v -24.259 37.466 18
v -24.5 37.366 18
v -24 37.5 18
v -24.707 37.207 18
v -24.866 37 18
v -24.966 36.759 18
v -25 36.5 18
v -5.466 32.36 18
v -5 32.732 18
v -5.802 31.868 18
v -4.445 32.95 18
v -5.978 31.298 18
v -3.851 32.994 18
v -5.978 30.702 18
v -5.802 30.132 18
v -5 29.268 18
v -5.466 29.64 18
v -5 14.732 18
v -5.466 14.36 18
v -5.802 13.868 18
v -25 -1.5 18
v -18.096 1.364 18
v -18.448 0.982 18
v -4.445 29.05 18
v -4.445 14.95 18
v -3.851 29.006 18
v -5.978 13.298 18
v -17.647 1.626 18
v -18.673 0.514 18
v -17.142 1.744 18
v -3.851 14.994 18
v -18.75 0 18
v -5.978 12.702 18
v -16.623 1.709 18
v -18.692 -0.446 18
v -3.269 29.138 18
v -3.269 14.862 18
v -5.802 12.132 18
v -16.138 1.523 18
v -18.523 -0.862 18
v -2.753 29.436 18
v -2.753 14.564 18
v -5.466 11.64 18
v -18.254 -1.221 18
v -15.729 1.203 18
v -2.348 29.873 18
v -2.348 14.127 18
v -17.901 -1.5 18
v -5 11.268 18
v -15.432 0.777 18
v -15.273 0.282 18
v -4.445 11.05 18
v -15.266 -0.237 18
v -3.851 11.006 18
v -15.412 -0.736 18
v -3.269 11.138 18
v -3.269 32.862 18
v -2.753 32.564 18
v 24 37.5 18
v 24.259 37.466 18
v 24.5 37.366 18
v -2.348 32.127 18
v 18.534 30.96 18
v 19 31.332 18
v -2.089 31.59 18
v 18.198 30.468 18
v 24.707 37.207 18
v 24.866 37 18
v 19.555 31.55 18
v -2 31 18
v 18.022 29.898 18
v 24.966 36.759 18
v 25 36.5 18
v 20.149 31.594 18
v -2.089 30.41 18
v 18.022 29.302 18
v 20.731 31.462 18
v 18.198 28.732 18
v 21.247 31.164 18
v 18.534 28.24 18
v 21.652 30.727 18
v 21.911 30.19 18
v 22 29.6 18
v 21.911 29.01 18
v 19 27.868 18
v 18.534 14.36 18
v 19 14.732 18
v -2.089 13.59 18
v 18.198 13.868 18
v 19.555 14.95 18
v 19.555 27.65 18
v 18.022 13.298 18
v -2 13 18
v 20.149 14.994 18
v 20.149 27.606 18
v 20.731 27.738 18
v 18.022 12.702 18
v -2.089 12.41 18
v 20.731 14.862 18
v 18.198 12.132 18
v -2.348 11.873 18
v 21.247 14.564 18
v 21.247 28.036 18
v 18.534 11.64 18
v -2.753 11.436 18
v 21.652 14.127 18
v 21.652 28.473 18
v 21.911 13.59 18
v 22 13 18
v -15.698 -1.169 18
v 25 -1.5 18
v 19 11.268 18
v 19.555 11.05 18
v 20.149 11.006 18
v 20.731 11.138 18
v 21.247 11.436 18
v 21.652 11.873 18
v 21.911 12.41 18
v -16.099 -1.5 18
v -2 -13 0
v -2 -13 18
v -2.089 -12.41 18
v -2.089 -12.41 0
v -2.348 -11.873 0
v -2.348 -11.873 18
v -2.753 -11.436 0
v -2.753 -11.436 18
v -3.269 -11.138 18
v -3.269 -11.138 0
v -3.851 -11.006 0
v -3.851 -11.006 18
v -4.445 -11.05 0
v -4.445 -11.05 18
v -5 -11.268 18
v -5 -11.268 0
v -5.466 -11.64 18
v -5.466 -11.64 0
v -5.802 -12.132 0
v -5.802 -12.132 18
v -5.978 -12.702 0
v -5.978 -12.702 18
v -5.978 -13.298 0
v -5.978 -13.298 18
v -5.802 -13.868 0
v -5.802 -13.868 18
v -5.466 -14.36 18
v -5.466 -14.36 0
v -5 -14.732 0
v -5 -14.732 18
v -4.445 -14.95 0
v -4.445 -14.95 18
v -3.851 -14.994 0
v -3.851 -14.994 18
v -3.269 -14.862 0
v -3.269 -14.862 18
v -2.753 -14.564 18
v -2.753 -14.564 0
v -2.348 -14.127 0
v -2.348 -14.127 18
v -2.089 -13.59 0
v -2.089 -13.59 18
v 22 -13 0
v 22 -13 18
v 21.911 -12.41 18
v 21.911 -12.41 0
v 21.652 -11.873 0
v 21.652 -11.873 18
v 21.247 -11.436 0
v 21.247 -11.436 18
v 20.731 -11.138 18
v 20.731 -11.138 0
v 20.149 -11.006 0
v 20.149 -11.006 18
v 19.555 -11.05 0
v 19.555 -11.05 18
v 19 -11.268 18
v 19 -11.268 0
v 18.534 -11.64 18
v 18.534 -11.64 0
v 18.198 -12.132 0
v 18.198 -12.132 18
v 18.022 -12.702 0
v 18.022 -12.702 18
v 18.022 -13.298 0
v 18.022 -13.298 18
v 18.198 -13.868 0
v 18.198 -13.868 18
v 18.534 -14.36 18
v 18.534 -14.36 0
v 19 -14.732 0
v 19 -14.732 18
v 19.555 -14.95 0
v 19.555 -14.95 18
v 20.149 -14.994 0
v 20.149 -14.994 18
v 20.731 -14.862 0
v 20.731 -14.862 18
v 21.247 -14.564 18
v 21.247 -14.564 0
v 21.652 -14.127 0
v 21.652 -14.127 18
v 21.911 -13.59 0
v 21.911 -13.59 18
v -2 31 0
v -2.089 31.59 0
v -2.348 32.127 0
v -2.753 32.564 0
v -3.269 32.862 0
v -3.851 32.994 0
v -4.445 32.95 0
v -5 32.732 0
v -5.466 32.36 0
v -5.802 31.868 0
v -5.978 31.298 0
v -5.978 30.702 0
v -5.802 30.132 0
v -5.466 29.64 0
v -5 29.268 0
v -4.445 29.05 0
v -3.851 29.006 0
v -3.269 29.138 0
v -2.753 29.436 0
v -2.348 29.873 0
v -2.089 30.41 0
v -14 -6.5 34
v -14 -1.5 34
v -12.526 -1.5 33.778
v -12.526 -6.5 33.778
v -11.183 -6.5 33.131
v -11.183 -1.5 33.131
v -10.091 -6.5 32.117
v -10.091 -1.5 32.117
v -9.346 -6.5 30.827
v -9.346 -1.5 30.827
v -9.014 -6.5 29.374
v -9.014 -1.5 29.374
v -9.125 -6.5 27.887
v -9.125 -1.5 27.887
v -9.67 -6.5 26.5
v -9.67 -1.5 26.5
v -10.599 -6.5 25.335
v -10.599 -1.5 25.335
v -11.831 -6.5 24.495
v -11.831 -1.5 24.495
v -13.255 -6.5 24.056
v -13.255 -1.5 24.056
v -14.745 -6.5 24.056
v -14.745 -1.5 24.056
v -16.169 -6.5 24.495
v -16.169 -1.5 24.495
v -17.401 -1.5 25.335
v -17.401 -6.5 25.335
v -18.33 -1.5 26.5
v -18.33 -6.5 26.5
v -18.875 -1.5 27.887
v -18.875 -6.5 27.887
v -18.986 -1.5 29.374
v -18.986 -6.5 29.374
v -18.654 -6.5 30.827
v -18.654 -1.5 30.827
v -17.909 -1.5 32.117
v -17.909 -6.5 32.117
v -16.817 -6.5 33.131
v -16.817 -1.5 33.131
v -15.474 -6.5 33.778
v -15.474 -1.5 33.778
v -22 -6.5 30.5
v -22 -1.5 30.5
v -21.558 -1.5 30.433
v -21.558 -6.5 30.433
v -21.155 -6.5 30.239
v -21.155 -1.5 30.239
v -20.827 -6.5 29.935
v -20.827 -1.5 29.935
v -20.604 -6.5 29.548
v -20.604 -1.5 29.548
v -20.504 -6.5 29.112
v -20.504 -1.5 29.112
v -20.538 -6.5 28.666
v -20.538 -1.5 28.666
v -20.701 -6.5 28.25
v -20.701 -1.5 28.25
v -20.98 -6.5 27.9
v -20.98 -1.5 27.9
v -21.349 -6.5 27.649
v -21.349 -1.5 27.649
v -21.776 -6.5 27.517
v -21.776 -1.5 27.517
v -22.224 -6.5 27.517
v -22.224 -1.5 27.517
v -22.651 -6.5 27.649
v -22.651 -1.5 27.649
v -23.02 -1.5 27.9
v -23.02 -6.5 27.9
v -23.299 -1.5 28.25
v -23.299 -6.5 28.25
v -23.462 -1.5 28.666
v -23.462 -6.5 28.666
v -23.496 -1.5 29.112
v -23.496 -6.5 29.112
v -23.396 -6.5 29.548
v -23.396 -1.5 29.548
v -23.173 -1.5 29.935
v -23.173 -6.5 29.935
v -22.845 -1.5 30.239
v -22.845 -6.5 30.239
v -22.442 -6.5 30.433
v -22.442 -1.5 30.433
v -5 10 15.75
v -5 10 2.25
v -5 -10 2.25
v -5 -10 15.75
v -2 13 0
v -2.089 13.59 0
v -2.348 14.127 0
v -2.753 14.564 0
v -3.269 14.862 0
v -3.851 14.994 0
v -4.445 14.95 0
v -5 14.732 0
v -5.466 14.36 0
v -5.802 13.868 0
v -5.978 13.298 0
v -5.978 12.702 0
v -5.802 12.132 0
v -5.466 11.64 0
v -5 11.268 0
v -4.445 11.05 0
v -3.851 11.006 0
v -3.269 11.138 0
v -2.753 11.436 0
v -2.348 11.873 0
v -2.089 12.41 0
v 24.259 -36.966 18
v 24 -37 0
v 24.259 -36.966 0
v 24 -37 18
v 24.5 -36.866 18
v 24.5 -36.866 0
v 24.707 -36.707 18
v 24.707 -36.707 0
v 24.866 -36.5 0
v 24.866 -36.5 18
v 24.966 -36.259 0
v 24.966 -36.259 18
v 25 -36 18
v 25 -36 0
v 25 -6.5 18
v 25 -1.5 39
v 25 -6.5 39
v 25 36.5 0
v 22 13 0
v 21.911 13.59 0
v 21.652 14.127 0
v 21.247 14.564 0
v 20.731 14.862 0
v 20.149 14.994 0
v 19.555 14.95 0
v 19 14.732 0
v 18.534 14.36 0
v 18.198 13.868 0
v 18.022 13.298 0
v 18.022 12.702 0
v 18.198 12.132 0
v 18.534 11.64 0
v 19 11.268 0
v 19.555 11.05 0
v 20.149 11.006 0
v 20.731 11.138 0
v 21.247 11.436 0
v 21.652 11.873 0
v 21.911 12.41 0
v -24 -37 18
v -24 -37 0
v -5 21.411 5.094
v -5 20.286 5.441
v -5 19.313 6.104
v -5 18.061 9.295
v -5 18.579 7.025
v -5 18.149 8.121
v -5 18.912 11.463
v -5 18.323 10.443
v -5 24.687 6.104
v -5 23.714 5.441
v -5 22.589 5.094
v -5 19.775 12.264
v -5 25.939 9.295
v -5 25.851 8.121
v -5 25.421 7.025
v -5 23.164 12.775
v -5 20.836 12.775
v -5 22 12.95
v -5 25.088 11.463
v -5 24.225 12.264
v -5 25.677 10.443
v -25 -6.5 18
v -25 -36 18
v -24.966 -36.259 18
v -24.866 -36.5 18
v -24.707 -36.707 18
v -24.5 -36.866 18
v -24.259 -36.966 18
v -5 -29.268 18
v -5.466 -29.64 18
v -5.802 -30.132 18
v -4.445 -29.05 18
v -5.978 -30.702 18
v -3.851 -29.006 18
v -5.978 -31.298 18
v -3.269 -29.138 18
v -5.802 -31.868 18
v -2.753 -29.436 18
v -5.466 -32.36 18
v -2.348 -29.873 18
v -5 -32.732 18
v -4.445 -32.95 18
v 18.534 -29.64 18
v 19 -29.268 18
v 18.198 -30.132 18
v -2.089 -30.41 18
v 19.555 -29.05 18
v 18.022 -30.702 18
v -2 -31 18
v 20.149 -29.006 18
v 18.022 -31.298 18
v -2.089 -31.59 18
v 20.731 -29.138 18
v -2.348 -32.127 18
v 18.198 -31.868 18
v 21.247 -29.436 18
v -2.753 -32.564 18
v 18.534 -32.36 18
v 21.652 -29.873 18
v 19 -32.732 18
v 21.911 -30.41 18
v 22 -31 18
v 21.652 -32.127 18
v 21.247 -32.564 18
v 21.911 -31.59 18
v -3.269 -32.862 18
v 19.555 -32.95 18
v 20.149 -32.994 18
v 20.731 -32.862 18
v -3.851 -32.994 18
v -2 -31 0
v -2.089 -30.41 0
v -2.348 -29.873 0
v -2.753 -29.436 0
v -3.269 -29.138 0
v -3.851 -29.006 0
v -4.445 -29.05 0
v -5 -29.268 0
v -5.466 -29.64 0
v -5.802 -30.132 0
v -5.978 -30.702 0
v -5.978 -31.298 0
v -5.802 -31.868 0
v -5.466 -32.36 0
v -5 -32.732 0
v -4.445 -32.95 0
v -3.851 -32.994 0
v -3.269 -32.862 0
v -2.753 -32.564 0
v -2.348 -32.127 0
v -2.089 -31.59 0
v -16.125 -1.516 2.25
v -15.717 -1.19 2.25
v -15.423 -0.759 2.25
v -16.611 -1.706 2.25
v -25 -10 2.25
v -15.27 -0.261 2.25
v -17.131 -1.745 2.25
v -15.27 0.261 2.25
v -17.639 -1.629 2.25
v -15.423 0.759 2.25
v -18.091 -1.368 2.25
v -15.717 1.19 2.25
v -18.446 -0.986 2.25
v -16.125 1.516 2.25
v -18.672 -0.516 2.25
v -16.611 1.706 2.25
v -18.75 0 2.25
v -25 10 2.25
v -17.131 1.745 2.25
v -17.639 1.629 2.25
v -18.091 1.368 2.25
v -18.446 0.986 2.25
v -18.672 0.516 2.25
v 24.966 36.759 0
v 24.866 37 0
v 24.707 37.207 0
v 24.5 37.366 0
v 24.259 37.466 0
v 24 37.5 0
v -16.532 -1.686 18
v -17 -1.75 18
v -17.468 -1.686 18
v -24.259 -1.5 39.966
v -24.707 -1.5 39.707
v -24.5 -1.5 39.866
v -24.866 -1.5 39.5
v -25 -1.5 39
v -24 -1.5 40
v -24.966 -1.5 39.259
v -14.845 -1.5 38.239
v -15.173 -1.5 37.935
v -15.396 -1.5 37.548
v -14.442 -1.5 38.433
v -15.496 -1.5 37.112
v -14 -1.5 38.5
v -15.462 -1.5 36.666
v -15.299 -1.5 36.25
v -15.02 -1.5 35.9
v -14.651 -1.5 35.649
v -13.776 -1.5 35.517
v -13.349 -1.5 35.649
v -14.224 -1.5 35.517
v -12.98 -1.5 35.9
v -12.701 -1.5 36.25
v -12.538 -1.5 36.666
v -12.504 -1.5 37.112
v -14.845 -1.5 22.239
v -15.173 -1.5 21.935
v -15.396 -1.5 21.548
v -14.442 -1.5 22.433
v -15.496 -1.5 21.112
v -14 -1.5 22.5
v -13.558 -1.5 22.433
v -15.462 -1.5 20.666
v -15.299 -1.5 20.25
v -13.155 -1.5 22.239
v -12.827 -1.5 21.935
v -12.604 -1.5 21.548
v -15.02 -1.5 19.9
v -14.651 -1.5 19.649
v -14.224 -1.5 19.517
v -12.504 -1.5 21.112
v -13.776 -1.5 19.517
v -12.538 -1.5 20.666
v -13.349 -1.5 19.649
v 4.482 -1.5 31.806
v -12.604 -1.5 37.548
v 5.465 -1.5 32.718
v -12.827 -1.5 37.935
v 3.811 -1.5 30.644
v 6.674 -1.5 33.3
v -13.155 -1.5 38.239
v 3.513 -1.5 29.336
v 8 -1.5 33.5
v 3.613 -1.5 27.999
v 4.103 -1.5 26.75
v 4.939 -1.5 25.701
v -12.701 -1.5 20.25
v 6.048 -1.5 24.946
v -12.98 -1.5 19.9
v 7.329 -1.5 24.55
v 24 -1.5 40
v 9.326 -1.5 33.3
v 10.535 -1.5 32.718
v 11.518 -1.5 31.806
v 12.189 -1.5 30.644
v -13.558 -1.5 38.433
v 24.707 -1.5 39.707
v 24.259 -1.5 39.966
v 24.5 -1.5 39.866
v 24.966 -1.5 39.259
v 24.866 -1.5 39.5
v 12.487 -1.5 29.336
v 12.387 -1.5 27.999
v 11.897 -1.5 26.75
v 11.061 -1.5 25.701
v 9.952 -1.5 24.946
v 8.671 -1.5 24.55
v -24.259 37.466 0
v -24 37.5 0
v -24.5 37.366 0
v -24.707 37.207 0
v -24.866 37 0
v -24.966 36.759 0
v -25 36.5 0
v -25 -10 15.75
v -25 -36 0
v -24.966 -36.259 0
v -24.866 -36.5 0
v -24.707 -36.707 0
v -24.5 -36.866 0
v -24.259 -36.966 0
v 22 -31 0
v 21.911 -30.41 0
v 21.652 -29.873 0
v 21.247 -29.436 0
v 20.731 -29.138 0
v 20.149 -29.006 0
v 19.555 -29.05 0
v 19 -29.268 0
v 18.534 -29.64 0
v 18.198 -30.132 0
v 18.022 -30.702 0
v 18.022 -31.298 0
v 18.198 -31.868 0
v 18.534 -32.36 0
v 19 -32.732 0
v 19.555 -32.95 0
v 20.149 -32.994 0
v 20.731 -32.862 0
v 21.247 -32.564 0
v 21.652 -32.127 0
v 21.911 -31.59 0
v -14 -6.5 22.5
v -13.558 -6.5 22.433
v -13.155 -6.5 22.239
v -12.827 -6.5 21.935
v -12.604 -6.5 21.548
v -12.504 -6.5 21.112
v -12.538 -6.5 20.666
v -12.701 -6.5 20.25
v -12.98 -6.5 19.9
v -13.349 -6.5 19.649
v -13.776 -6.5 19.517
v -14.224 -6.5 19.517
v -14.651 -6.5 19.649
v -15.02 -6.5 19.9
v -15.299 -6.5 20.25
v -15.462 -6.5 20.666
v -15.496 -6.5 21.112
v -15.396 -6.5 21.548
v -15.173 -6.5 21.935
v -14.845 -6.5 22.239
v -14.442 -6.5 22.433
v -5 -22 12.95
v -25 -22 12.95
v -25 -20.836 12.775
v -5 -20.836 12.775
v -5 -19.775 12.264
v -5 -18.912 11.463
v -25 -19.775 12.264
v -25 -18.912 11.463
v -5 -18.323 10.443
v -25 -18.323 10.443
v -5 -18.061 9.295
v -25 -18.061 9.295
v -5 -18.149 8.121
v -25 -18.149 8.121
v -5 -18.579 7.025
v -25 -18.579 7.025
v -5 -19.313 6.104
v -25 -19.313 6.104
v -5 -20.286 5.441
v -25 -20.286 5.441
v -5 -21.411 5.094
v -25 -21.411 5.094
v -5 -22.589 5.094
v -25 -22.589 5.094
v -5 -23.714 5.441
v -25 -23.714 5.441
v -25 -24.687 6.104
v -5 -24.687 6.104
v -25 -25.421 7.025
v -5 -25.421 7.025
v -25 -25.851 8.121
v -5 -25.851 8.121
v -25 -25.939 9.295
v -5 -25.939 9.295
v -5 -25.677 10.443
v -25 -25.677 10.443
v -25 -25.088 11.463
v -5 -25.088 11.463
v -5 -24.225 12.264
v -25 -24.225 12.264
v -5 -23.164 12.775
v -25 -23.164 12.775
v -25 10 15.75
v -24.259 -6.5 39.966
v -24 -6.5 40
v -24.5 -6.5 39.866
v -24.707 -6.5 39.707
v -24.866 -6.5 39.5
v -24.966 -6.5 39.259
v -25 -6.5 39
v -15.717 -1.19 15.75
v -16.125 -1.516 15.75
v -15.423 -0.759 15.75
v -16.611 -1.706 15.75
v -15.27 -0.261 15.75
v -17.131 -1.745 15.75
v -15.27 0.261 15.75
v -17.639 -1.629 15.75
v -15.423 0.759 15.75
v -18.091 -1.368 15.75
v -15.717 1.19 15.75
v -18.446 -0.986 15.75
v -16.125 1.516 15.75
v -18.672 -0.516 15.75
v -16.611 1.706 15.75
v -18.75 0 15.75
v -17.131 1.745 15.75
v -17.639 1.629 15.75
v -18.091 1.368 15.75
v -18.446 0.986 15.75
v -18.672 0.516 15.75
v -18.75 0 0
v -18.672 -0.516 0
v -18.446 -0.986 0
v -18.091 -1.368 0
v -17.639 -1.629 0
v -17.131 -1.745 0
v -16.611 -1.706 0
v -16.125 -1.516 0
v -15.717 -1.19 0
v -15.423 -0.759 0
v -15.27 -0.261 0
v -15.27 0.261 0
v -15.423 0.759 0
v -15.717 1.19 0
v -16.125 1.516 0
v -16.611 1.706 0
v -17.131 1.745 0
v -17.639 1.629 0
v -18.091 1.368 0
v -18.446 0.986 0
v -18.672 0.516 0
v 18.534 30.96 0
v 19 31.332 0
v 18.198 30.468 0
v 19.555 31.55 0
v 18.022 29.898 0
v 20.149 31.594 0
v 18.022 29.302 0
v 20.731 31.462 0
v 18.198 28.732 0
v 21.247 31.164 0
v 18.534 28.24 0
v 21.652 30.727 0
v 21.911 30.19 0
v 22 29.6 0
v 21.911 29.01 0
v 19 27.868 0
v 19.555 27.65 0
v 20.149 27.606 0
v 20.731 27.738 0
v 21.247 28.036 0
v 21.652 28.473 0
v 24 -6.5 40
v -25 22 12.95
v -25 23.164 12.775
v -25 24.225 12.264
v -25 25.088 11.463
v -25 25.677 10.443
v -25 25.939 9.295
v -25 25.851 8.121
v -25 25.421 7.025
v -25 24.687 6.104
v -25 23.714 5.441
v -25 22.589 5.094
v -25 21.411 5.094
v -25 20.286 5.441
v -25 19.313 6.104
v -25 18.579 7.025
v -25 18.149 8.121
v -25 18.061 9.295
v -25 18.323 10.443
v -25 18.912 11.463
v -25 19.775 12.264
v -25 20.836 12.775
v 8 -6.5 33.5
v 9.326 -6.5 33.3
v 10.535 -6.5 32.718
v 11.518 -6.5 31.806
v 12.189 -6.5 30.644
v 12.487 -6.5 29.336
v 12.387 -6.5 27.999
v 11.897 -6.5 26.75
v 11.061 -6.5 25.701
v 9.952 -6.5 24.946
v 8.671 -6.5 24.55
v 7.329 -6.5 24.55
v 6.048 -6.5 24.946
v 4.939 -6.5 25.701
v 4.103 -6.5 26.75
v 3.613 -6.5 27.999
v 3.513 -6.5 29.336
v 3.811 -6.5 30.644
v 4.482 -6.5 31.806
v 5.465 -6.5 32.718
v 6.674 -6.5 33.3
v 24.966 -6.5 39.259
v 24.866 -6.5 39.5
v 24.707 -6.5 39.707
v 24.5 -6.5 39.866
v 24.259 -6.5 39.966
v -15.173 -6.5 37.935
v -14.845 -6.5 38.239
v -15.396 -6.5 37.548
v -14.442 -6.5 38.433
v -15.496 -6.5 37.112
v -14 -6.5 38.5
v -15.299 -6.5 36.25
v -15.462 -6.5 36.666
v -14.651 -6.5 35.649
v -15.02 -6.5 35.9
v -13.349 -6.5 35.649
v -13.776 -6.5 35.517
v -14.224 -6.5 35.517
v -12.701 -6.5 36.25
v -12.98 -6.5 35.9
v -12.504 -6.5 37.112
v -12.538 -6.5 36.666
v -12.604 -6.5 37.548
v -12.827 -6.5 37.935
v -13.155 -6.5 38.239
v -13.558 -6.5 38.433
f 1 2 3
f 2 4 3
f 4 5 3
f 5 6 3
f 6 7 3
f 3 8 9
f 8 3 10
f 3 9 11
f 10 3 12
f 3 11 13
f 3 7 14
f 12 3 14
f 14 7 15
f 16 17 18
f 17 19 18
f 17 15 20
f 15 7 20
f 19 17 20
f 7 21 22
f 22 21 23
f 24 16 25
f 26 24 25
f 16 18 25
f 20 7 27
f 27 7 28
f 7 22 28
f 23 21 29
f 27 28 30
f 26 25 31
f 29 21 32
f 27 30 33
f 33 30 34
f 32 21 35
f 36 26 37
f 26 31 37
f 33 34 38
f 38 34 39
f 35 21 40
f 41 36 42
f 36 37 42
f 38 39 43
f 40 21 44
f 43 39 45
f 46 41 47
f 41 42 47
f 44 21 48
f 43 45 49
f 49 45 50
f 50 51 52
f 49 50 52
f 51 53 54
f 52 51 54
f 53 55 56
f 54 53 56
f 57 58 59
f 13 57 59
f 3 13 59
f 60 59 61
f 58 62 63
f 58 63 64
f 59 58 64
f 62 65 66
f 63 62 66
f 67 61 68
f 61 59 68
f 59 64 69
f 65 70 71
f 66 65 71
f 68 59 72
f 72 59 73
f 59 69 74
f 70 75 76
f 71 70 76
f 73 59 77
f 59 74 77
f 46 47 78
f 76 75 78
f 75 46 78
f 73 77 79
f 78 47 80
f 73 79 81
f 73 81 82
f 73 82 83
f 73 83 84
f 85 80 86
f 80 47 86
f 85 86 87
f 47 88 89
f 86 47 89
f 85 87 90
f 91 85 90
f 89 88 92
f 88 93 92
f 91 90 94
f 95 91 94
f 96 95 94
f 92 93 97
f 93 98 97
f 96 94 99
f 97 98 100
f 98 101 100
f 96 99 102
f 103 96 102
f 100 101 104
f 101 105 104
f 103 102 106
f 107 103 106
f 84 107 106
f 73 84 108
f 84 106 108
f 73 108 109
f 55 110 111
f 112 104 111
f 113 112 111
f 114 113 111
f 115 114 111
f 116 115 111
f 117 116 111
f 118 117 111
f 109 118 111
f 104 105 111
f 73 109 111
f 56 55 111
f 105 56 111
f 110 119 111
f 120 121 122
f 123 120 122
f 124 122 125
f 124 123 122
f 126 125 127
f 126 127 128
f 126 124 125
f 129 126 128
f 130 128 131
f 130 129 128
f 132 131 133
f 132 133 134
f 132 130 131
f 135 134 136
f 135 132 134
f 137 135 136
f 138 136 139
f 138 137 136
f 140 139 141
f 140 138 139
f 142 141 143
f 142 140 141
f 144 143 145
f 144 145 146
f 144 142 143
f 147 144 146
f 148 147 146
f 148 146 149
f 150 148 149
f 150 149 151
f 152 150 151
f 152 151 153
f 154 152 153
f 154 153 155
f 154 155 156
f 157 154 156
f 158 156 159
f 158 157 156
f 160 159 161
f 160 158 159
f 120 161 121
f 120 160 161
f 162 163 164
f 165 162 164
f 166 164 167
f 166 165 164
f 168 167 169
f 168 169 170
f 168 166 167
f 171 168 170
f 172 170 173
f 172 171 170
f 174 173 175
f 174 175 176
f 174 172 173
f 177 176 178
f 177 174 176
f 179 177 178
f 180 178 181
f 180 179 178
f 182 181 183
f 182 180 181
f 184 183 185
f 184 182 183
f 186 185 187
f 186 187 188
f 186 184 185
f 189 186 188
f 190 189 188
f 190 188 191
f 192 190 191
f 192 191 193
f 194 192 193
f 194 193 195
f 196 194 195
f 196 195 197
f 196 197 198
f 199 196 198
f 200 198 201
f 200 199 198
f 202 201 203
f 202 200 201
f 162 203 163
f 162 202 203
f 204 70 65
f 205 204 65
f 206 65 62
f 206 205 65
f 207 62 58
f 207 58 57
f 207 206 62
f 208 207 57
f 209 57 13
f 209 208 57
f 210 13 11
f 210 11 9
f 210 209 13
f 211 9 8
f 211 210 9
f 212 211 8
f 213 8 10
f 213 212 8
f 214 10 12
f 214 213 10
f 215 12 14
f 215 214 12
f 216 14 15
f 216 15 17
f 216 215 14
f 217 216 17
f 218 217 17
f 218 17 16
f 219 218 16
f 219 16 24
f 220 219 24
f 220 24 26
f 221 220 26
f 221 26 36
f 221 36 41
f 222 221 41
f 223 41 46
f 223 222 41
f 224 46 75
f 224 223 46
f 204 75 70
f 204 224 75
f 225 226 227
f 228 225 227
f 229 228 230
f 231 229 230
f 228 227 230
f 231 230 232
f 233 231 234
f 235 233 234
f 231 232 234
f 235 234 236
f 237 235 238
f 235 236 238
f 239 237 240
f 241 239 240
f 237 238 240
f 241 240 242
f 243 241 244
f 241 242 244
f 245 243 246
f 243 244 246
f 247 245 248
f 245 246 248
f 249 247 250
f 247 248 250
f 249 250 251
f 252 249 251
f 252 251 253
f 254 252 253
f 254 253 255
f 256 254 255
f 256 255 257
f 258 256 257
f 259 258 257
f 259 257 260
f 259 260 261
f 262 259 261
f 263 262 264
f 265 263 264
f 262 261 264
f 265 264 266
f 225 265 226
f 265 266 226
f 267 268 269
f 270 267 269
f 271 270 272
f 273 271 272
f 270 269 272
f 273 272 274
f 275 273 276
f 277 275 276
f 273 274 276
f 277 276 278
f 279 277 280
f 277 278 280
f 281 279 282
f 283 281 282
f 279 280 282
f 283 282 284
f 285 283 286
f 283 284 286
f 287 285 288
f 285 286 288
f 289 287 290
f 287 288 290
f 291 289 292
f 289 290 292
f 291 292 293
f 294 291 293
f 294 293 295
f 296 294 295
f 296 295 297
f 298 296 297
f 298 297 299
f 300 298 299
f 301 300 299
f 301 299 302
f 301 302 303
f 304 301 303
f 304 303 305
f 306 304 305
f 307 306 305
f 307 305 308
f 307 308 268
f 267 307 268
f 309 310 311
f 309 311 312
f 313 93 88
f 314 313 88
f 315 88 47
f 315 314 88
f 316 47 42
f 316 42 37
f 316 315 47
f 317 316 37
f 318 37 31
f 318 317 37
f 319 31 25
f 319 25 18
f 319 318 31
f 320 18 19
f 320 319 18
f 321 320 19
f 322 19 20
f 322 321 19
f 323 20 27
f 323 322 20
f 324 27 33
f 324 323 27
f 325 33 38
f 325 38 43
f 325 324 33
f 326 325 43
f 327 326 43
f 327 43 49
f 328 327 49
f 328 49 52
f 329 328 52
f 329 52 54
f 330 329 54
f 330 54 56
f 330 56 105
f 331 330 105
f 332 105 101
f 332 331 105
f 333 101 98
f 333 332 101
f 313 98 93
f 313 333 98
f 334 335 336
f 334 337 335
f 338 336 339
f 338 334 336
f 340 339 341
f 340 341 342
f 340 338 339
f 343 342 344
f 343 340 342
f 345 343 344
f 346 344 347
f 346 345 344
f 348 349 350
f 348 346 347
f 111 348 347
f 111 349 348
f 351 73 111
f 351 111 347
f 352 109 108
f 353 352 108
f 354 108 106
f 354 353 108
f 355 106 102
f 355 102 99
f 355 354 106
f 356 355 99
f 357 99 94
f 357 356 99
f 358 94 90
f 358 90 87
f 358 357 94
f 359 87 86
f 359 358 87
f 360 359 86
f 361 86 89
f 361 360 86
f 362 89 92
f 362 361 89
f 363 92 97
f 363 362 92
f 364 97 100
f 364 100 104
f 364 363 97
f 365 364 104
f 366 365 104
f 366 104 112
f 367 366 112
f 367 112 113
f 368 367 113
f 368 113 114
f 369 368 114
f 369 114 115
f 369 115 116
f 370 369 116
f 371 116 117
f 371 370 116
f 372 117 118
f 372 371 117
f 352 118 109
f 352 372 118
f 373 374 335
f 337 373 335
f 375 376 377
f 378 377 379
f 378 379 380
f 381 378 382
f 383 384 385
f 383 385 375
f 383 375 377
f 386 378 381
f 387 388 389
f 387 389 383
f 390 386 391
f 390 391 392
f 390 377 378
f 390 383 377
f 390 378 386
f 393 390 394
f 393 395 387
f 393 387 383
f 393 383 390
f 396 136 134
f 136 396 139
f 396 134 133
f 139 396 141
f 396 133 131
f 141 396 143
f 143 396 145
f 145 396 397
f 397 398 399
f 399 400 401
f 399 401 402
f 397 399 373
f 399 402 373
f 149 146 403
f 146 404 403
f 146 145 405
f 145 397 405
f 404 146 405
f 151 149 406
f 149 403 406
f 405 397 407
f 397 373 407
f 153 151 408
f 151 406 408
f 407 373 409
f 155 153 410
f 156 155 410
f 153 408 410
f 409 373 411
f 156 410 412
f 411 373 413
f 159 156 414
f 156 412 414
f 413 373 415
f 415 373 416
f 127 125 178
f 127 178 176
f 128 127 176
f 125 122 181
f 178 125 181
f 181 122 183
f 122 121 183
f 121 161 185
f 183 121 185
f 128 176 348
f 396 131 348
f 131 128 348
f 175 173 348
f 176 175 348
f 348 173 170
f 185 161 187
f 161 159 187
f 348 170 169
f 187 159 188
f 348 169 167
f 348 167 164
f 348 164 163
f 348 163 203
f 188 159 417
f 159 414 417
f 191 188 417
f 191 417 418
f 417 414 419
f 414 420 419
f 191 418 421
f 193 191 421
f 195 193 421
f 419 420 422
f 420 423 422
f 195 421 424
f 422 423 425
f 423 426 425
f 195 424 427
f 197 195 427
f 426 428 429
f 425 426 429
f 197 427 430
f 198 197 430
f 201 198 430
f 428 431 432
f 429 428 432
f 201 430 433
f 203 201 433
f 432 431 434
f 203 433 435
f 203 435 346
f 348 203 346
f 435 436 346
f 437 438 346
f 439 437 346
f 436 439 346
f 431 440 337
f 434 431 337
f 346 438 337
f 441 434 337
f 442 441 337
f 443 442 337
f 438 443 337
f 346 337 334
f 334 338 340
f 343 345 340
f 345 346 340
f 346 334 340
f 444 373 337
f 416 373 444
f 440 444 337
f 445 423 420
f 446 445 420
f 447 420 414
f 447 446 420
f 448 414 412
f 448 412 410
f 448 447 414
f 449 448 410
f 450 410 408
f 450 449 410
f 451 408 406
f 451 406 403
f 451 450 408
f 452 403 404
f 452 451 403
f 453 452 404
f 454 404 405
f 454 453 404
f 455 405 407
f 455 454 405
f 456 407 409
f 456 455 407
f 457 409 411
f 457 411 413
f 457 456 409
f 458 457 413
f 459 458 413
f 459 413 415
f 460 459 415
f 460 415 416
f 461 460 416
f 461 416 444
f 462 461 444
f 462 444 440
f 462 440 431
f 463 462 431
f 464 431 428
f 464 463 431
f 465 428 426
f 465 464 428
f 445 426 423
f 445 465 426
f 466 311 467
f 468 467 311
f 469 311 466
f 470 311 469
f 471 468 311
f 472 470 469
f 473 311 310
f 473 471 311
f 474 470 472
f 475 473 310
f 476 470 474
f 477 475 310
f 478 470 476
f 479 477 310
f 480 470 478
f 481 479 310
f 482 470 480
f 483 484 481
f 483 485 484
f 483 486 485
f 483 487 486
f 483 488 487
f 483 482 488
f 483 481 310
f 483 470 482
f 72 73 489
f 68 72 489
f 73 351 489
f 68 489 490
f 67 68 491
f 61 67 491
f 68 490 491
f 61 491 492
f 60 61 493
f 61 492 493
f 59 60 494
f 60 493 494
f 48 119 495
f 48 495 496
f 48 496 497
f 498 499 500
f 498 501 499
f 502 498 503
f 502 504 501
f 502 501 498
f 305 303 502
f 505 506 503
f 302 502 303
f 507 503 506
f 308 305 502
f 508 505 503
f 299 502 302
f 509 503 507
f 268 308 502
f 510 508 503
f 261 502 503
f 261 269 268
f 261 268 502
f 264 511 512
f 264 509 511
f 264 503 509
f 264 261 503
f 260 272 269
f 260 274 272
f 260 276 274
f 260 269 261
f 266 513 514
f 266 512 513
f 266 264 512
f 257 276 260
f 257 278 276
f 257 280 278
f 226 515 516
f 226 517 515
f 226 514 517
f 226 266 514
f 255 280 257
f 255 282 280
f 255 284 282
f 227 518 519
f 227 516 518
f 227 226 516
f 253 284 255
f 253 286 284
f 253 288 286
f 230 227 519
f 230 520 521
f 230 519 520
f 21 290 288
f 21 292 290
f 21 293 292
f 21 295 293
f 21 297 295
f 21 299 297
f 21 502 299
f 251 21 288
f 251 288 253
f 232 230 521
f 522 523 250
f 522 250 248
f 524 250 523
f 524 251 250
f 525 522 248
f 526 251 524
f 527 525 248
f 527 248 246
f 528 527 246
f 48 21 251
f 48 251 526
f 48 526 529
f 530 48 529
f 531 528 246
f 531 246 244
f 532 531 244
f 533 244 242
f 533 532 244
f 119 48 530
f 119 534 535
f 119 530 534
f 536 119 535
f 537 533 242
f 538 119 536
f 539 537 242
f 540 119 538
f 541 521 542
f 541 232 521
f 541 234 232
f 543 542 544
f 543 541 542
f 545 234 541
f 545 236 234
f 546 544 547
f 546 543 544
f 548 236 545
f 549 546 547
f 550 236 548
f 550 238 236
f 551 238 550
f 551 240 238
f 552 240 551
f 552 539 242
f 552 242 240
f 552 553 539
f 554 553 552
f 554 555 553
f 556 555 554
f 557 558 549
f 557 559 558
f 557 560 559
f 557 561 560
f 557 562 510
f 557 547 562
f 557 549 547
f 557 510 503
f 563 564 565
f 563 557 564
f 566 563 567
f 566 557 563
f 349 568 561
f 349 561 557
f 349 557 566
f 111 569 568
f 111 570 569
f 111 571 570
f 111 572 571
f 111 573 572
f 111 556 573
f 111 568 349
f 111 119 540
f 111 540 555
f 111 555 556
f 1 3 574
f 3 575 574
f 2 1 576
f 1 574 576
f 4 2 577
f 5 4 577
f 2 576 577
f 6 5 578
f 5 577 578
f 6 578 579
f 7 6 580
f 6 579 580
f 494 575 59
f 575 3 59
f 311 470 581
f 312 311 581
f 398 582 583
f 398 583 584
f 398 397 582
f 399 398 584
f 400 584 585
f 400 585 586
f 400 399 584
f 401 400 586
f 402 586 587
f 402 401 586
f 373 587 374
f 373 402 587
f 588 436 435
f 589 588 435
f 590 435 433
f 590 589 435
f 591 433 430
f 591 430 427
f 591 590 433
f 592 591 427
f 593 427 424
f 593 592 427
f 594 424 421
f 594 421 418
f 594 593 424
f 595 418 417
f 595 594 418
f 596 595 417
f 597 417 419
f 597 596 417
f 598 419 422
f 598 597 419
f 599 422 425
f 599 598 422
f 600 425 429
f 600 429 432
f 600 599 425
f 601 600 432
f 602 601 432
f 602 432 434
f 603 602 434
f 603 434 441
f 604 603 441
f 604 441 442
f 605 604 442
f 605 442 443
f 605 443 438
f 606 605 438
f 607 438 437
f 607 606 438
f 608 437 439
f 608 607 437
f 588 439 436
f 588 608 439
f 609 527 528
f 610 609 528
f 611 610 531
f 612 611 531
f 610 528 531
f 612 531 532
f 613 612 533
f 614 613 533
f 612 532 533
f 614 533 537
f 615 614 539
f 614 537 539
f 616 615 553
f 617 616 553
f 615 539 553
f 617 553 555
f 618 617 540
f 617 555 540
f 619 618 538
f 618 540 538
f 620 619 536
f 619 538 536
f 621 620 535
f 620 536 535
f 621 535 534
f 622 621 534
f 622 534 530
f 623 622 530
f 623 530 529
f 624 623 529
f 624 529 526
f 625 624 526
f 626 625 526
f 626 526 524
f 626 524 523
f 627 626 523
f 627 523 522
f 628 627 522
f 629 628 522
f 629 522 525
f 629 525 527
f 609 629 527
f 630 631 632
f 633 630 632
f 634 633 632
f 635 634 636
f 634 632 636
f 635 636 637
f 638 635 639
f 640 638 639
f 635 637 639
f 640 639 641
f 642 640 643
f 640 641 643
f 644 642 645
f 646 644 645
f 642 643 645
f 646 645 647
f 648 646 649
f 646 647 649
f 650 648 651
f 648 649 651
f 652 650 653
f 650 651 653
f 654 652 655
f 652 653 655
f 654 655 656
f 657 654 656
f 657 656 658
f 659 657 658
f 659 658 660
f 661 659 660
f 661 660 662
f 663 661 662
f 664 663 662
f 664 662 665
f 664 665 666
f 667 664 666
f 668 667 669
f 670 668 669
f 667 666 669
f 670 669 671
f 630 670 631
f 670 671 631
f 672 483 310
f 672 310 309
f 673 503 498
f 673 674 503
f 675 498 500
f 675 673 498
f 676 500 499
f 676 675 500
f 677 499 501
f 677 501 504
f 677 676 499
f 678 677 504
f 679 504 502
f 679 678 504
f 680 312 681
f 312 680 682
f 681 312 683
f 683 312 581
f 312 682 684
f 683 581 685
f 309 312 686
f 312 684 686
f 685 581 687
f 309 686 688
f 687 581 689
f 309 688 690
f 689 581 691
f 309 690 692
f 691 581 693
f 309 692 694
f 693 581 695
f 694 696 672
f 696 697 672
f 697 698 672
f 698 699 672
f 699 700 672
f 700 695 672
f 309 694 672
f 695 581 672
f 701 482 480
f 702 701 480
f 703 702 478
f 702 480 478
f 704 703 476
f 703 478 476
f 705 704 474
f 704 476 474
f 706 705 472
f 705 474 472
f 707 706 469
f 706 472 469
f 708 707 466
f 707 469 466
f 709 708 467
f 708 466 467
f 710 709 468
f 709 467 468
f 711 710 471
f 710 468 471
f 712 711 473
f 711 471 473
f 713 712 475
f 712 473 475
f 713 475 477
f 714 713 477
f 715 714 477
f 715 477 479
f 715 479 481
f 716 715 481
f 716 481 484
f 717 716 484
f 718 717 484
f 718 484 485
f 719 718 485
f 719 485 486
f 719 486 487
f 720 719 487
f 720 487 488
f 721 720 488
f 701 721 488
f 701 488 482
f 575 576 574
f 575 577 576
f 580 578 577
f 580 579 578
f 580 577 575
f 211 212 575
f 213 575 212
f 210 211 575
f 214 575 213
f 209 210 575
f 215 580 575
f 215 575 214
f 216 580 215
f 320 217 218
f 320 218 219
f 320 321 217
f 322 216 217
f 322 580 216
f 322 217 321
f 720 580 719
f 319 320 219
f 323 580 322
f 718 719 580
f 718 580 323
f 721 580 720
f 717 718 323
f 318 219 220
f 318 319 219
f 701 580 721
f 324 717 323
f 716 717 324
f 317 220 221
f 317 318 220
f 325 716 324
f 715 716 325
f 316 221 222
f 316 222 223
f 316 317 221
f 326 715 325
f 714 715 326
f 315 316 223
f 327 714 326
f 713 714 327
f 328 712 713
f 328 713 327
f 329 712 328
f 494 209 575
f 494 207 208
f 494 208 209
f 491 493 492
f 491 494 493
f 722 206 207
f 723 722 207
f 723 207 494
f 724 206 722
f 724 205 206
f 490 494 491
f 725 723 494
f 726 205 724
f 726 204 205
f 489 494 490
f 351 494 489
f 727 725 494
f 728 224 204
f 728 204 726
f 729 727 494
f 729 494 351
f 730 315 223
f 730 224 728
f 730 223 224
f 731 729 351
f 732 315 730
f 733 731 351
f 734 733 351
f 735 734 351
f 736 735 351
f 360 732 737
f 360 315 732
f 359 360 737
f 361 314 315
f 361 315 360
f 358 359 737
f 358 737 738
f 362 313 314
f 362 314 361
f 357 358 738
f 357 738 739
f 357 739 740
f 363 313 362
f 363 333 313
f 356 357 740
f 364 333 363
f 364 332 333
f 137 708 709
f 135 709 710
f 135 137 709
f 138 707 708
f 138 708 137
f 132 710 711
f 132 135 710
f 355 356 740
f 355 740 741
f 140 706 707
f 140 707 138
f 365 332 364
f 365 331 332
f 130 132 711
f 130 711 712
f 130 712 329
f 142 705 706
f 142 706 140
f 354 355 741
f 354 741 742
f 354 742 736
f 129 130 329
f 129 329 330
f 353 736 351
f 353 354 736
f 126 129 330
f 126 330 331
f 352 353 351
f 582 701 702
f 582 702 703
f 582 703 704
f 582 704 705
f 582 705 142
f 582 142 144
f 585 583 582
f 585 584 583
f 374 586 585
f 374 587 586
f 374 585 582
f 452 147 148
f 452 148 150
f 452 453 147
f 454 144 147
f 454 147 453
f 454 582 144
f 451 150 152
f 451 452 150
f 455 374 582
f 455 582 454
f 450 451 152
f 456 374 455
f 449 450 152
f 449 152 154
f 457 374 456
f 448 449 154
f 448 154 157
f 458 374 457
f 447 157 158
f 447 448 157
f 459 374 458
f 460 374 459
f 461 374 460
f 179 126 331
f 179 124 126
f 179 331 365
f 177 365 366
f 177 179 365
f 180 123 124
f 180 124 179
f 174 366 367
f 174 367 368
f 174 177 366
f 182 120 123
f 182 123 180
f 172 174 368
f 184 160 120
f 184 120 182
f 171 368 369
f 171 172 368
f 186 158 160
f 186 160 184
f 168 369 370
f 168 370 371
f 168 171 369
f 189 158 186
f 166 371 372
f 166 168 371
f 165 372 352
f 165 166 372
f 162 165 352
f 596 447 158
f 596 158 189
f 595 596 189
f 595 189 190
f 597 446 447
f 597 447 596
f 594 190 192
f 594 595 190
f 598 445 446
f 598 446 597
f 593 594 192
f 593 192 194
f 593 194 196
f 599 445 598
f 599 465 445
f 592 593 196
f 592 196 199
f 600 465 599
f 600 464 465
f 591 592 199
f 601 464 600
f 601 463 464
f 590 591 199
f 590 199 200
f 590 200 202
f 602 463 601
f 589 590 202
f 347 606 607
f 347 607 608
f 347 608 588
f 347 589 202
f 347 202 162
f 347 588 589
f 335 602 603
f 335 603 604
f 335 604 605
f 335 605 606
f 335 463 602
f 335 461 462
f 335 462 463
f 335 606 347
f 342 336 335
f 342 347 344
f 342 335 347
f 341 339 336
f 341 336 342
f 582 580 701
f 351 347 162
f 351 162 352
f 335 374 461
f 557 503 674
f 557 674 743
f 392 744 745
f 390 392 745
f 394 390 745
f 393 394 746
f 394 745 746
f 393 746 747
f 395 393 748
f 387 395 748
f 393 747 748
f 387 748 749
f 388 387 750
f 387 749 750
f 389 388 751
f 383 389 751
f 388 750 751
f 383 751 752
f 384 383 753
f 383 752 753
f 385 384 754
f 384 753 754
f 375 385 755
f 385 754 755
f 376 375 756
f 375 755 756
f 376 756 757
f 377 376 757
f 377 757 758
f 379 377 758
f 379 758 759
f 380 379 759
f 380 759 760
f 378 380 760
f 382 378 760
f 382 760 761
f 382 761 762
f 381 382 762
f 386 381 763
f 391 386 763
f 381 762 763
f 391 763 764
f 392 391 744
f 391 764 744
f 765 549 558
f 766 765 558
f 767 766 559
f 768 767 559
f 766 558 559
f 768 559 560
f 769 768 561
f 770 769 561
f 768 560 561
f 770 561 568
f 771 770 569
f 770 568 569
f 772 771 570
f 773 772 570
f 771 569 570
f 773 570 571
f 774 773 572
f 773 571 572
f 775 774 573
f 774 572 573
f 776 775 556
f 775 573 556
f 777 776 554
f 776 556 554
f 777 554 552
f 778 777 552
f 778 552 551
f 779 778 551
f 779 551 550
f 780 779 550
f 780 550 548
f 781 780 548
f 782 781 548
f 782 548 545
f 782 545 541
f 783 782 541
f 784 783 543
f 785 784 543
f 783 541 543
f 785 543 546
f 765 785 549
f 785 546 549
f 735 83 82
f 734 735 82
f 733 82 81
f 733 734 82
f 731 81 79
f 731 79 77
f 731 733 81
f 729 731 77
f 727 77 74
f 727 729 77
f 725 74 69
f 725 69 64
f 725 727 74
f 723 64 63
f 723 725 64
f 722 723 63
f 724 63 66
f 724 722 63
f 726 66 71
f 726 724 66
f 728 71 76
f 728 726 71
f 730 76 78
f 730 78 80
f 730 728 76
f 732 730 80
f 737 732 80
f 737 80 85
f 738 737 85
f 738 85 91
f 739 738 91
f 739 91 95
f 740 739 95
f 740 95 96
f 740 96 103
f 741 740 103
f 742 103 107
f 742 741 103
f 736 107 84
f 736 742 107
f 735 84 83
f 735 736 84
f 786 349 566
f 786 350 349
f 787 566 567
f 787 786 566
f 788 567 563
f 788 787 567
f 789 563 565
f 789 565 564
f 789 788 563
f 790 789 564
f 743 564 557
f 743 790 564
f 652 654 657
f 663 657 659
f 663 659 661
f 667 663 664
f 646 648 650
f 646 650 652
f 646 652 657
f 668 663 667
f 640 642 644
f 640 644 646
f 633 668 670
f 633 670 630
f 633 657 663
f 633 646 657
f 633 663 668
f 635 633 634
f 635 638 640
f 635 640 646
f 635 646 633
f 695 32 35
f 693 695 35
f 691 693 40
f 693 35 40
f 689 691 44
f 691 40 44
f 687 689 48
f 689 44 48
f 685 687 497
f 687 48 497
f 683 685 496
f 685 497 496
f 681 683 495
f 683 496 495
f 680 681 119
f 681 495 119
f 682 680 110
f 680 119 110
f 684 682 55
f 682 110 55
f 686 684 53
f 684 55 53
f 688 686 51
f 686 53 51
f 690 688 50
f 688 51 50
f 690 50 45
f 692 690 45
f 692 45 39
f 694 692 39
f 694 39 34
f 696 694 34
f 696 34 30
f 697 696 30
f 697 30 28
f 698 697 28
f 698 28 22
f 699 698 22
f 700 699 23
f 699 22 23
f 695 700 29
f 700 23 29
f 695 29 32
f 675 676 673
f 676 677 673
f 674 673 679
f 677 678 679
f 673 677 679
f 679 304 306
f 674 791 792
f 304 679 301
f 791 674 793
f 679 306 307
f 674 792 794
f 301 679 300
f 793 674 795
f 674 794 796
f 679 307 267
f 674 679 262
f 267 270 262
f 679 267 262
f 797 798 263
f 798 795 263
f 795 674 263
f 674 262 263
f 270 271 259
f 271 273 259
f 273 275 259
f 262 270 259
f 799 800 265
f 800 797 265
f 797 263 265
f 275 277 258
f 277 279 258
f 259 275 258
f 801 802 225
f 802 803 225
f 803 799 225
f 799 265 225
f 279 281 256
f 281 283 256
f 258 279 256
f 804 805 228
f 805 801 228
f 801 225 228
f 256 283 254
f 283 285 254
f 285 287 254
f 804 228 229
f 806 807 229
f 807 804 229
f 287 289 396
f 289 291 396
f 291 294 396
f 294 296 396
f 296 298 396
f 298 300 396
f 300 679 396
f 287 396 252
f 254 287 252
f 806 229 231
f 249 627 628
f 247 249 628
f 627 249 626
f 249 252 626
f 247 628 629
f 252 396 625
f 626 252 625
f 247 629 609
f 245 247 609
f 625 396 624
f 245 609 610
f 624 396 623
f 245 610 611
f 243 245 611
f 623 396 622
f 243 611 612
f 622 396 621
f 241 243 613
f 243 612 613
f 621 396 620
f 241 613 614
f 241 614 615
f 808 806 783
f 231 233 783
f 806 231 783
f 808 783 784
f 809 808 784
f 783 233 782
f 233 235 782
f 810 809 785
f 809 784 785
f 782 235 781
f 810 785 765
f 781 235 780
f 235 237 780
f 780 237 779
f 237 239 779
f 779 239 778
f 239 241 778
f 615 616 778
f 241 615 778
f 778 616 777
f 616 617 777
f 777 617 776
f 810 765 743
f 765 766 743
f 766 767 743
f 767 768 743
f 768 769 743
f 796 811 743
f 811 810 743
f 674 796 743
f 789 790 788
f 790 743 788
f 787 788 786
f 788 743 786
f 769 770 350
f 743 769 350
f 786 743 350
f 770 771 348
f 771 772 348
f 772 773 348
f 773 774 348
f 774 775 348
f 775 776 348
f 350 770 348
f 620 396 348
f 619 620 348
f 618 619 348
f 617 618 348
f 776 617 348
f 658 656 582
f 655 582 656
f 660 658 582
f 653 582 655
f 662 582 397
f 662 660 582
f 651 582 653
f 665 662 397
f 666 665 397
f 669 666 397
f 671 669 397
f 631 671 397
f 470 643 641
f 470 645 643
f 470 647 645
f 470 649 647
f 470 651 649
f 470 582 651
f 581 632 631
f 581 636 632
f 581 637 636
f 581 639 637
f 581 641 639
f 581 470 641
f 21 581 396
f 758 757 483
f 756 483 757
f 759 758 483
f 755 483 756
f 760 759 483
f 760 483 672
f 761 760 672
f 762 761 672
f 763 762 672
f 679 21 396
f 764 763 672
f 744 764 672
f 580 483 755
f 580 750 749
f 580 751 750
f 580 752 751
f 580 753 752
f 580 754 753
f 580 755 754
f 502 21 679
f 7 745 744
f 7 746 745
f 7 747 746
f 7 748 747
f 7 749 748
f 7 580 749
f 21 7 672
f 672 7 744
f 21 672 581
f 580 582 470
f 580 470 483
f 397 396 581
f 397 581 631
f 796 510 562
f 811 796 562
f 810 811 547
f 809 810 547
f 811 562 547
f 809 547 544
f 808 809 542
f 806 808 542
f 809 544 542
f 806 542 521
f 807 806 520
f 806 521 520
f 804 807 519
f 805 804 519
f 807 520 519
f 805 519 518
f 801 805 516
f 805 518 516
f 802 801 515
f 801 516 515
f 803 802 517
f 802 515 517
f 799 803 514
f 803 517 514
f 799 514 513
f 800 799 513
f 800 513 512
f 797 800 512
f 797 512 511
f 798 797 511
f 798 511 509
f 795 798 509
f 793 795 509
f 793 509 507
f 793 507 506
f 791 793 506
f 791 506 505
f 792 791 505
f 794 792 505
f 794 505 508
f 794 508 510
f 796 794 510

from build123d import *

# Parameters (mm, degrees)
SKETCH1_W           = 50
SKETCH1_H           = 74
SKETCH1_R           = 2
BOSS_EXTRUDE1_DEPTH = 18
SKETCH5_W           = 50
SKETCH5_H           = 18
BOSS_EXTRUDE3_DEPTH = 5.5
SKETCH7_W           = 50
SKETCH7_H           = 5
BOSS_EXTRUDE5_DEPTH = 22
CUT_EXTRUDE1_REACH  = 94.441
SKETCH8_R           = 4.5
SKETCH8_R_2         = 5
SKETCH10_R          = 3.95
SKETCH10_W          = 13.5
SKETCH10_H          = 20
CUT_EXTRUDE2_DEPTH  = 20
CUT_EXTRUDE3_REACH  = 55.993
SKETCH11_R          = 1.75
FILLET2_R           = 1
BOSS_EXTRUDE6_START = -44
SKETCH12_R          = 5
SKETCH12_R_2        = 4.5
BOSS_EXTRUDE6_DEPTH = 5
CUT_EXTRUDE4_REACH  = 65.492
FILLET3_R           = 1
CUT_EXTRUDE5_REACH  = 63.205
SKETCH14_R          = 1.5


with BuildPart() as part:
    # Sketch1 → Boss-Extrude1 (new body)
    with BuildSketch(Plane.XY):
        Rectangle(SKETCH1_W, SKETCH1_H)
        with Locations((-4, 31)):
            Circle(SKETCH1_R, mode=Mode.SUBTRACT)
        with Locations((20, 29.6)):
            Circle(SKETCH1_R, mode=Mode.SUBTRACT)
        with Locations((20, 13)):
            Circle(SKETCH1_R, mode=Mode.SUBTRACT)
        with Locations((-4, 13)):
            Circle(SKETCH1_R, mode=Mode.SUBTRACT)
        with Locations((-4, -13)):
            Circle(SKETCH1_R, mode=Mode.SUBTRACT)
        with Locations((20, -13)):
            Circle(SKETCH1_R, mode=Mode.SUBTRACT)
        with Locations((20, -31)):
            Circle(SKETCH1_R, mode=Mode.SUBTRACT)
        with Locations((-4, -31)):
            Circle(SKETCH1_R, mode=Mode.SUBTRACT)
    extrude(amount=BOSS_EXTRUDE1_DEPTH)

    # Sketch5 → Boss-Extrude3 (add)
    with BuildSketch(Plane(origin=(0, 37, 0), x_dir=(1, 0, 0), z_dir=(0, 1, 0))):
        with Locations((0, -9)):
            Rectangle(SKETCH5_W, SKETCH5_H)
    extrude(amount=BOSS_EXTRUDE3_DEPTH)

    # Sketch7 → Boss-Extrude5 (add)
    with BuildSketch(Plane.XY.offset(18)):
        with Locations((0, 40)):
            Rectangle(SKETCH7_W, SKETCH7_H)
    extrude(amount=BOSS_EXTRUDE5_DEPTH)

    # Sketch8 → Cut-Extrude1 (cut, up to next)
    with BuildSketch(Plane(origin=(0, 42.5, 0), x_dir=(1, 0, 0), z_dir=(0, 1, 0)), mode=Mode.PRIVATE) as cut_extrude1_sk1:
        with Locations(Location((8, -29, 0), (0, 0, 270))):
            Circle(SKETCH8_R)
    cut_extrude1_tool1 = extrude(cut_extrude1_sk1.sketch, amount=-CUT_EXTRUDE1_REACH, mode=Mode.PRIVATE) & part.part
    # Sketch8 → Cut-Extrude1 (cut, up to next)
    with BuildSketch(Plane(origin=(0, 42.5, 0), x_dir=(1, 0, 0), z_dir=(0, 1, 0)), mode=Mode.PRIVATE) as cut_extrude1_sk2:
        with Locations(Location((-14, -29, 0), (0, 0, 270))):
            Circle(SKETCH8_R_2)
    cut_extrude1_tool2 = extrude(cut_extrude1_sk2.sketch, amount=-CUT_EXTRUDE1_REACH, mode=Mode.PRIVATE) & part.part
    add(cut_extrude1_tool1.solids().sort_by_distance((8, 42.5, 29))[0], mode=Mode.SUBTRACT)
    add(cut_extrude1_tool2.solids().sort_by_distance((-14, 42.5, 29))[0], mode=Mode.SUBTRACT)

    # Sketch10 → Cut-Extrude2 (cut)
    with BuildSketch(Plane.ZY.offset(25)):
        with Locations((9, 22)):
            Circle(SKETCH10_R)
        with Locations((9, -22)):
            Circle(SKETCH10_R)
        with Locations((9, 0)):
            Rectangle(SKETCH10_W, SKETCH10_H)
    extrude(amount=-CUT_EXTRUDE2_DEPTH, mode=Mode.SUBTRACT)

    # Cut-Extrude3: up to this face of the body (flat: up to its plane)
    cut_extrude3_end = Plane(part.part.faces().sort_by_distance((-0.207576241, 2.825895063, 0))[0])
    # Sketch11 → Cut-Extrude3 (cut, up to the picked face)
    with BuildSketch(Plane.XY.offset(18), mode=Mode.PRIVATE) as cut_extrude3_sk1:
        with Locations(Location((-17, 0, 0), (0, 0, 180))):
            Circle(SKETCH11_R)
    cut_extrude3_tool1 = split(extrude(cut_extrude3_sk1.sketch, amount=-CUT_EXTRUDE3_REACH, mode=Mode.PRIVATE), bisect_by=cut_extrude3_end, keep=Keep.BOTH, mode=Mode.PRIVATE)
    add(cut_extrude3_tool1.solids().sort_by(Axis((-17, 0, 18), (0, 0, -1)))[0], mode=Mode.SUBTRACT)

    # Fillet2
    fillet2_edges = [part.edges().sort_by_distance(p)[0] for p in [
        (25, 42.5, 20),
        (-25, 42.5, 20),
        (25, -37, 9),
        (-25, -37, 9),
    ]]
    fillet(fillet2_edges, radius=FILLET2_R)

    # Sketch12 → Boss-Extrude6 (add)
    with BuildSketch(Plane(origin=(0, 42.5, 0), x_dir=(1, 0, 0), z_dir=(0, 1, 0)).offset(BOSS_EXTRUDE6_START)):
        Polygon((24, -40), (25, -40), (25, -18), (-25, -18), (-25, -40), (-24, -40), align=None)
        with Locations(Location((-14, -29, 0), (0, 0, 270))):
            Circle(SKETCH12_R, mode=Mode.SUBTRACT)
        with Locations(Location((8, -29, 0), (0, 0, 270))):
            Circle(SKETCH12_R_2, mode=Mode.SUBTRACT)
    extrude(amount=-BOSS_EXTRUDE6_DEPTH)

    # Sketch13 → Cut-Extrude4 (cut, up to next)
    with BuildSketch(Plane.XY.offset(40), mode=Mode.PRIVATE) as cut_extrude4_sk1:
        with BuildLine():
            Line((25, 37.5), (25, 41.5))
            ThreePointArc((25, 41.5), (24.707106781, 42.207106781), (24, 42.5))
            Line((24, 42.5), (-24, 42.5))
            ThreePointArc((-24, 42.5), (-24.707106781, 42.207106781), (-25, 41.5))
            Line((-25, 41.5), (-25, 37.5))
            Line((-25, 37.5), (25, 37.5))
        make_face()
    cut_extrude4_tool1 = extrude(cut_extrude4_sk1.sketch, amount=-CUT_EXTRUDE4_REACH, mode=Mode.PRIVATE) & part.part
    add(cut_extrude4_tool1.solids().sort_by_distance((0, 39.996085, 40))[0], mode=Mode.SUBTRACT)

    # Fillet3
    fillet3_edges = [part.edges().sort_by_distance(p)[0] for p in [
        (25, -4, 40),
        (-25, -4, 40),
        (25, 37.5, 9),
        (-25, 37.5, 9),
    ]]
    fillet(fillet3_edges, radius=FILLET3_R)

    # Sketch14 → Cut-Extrude5 (cut, up to next)
    with BuildSketch(Plane(origin=(0, -1.5, 0), x_dir=(1, 0, 0), z_dir=(0, 1, 0)), mode=Mode.PRIVATE) as cut_extrude5_sk1:
        with Locations(Location((-14, -21, 0), (0, 0, 270))):
            Circle(SKETCH14_R)
    cut_extrude5_tool1 = extrude(cut_extrude5_sk1.sketch, amount=-CUT_EXTRUDE5_REACH, mode=Mode.PRIVATE) & part.part
    # Sketch14 → Cut-Extrude5 (cut, up to next)
    with BuildSketch(Plane(origin=(0, -1.5, 0), x_dir=(1, 0, 0), z_dir=(0, 1, 0)), mode=Mode.PRIVATE) as cut_extrude5_sk2:
        with Locations(Location((-22, -29, 0), (0, 0, 270))):
            Circle(SKETCH14_R)
    cut_extrude5_tool2 = extrude(cut_extrude5_sk2.sketch, amount=-CUT_EXTRUDE5_REACH, mode=Mode.PRIVATE) & part.part
    # Sketch14 → Cut-Extrude5 (cut, up to next)
    with BuildSketch(Plane(origin=(0, -1.5, 0), x_dir=(1, 0, 0), z_dir=(0, 1, 0)), mode=Mode.PRIVATE) as cut_extrude5_sk3:
        with Locations(Location((-14, -37, 0), (0, 0, 270))):
            Circle(SKETCH14_R)
    cut_extrude5_tool3 = extrude(cut_extrude5_sk3.sketch, amount=-CUT_EXTRUDE5_REACH, mode=Mode.PRIVATE) & part.part
    add(cut_extrude5_tool1.solids().sort_by_distance((-14, -1.5, 21))[0], mode=Mode.SUBTRACT)
    add(cut_extrude5_tool2.solids().sort_by_distance((-22, -1.5, 29))[0], mode=Mode.SUBTRACT)
    add(cut_extrude5_tool3.solids().sort_by_distance((-14, -1.5, 37))[0], mode=Mode.SUBTRACT)


solid = part.part
